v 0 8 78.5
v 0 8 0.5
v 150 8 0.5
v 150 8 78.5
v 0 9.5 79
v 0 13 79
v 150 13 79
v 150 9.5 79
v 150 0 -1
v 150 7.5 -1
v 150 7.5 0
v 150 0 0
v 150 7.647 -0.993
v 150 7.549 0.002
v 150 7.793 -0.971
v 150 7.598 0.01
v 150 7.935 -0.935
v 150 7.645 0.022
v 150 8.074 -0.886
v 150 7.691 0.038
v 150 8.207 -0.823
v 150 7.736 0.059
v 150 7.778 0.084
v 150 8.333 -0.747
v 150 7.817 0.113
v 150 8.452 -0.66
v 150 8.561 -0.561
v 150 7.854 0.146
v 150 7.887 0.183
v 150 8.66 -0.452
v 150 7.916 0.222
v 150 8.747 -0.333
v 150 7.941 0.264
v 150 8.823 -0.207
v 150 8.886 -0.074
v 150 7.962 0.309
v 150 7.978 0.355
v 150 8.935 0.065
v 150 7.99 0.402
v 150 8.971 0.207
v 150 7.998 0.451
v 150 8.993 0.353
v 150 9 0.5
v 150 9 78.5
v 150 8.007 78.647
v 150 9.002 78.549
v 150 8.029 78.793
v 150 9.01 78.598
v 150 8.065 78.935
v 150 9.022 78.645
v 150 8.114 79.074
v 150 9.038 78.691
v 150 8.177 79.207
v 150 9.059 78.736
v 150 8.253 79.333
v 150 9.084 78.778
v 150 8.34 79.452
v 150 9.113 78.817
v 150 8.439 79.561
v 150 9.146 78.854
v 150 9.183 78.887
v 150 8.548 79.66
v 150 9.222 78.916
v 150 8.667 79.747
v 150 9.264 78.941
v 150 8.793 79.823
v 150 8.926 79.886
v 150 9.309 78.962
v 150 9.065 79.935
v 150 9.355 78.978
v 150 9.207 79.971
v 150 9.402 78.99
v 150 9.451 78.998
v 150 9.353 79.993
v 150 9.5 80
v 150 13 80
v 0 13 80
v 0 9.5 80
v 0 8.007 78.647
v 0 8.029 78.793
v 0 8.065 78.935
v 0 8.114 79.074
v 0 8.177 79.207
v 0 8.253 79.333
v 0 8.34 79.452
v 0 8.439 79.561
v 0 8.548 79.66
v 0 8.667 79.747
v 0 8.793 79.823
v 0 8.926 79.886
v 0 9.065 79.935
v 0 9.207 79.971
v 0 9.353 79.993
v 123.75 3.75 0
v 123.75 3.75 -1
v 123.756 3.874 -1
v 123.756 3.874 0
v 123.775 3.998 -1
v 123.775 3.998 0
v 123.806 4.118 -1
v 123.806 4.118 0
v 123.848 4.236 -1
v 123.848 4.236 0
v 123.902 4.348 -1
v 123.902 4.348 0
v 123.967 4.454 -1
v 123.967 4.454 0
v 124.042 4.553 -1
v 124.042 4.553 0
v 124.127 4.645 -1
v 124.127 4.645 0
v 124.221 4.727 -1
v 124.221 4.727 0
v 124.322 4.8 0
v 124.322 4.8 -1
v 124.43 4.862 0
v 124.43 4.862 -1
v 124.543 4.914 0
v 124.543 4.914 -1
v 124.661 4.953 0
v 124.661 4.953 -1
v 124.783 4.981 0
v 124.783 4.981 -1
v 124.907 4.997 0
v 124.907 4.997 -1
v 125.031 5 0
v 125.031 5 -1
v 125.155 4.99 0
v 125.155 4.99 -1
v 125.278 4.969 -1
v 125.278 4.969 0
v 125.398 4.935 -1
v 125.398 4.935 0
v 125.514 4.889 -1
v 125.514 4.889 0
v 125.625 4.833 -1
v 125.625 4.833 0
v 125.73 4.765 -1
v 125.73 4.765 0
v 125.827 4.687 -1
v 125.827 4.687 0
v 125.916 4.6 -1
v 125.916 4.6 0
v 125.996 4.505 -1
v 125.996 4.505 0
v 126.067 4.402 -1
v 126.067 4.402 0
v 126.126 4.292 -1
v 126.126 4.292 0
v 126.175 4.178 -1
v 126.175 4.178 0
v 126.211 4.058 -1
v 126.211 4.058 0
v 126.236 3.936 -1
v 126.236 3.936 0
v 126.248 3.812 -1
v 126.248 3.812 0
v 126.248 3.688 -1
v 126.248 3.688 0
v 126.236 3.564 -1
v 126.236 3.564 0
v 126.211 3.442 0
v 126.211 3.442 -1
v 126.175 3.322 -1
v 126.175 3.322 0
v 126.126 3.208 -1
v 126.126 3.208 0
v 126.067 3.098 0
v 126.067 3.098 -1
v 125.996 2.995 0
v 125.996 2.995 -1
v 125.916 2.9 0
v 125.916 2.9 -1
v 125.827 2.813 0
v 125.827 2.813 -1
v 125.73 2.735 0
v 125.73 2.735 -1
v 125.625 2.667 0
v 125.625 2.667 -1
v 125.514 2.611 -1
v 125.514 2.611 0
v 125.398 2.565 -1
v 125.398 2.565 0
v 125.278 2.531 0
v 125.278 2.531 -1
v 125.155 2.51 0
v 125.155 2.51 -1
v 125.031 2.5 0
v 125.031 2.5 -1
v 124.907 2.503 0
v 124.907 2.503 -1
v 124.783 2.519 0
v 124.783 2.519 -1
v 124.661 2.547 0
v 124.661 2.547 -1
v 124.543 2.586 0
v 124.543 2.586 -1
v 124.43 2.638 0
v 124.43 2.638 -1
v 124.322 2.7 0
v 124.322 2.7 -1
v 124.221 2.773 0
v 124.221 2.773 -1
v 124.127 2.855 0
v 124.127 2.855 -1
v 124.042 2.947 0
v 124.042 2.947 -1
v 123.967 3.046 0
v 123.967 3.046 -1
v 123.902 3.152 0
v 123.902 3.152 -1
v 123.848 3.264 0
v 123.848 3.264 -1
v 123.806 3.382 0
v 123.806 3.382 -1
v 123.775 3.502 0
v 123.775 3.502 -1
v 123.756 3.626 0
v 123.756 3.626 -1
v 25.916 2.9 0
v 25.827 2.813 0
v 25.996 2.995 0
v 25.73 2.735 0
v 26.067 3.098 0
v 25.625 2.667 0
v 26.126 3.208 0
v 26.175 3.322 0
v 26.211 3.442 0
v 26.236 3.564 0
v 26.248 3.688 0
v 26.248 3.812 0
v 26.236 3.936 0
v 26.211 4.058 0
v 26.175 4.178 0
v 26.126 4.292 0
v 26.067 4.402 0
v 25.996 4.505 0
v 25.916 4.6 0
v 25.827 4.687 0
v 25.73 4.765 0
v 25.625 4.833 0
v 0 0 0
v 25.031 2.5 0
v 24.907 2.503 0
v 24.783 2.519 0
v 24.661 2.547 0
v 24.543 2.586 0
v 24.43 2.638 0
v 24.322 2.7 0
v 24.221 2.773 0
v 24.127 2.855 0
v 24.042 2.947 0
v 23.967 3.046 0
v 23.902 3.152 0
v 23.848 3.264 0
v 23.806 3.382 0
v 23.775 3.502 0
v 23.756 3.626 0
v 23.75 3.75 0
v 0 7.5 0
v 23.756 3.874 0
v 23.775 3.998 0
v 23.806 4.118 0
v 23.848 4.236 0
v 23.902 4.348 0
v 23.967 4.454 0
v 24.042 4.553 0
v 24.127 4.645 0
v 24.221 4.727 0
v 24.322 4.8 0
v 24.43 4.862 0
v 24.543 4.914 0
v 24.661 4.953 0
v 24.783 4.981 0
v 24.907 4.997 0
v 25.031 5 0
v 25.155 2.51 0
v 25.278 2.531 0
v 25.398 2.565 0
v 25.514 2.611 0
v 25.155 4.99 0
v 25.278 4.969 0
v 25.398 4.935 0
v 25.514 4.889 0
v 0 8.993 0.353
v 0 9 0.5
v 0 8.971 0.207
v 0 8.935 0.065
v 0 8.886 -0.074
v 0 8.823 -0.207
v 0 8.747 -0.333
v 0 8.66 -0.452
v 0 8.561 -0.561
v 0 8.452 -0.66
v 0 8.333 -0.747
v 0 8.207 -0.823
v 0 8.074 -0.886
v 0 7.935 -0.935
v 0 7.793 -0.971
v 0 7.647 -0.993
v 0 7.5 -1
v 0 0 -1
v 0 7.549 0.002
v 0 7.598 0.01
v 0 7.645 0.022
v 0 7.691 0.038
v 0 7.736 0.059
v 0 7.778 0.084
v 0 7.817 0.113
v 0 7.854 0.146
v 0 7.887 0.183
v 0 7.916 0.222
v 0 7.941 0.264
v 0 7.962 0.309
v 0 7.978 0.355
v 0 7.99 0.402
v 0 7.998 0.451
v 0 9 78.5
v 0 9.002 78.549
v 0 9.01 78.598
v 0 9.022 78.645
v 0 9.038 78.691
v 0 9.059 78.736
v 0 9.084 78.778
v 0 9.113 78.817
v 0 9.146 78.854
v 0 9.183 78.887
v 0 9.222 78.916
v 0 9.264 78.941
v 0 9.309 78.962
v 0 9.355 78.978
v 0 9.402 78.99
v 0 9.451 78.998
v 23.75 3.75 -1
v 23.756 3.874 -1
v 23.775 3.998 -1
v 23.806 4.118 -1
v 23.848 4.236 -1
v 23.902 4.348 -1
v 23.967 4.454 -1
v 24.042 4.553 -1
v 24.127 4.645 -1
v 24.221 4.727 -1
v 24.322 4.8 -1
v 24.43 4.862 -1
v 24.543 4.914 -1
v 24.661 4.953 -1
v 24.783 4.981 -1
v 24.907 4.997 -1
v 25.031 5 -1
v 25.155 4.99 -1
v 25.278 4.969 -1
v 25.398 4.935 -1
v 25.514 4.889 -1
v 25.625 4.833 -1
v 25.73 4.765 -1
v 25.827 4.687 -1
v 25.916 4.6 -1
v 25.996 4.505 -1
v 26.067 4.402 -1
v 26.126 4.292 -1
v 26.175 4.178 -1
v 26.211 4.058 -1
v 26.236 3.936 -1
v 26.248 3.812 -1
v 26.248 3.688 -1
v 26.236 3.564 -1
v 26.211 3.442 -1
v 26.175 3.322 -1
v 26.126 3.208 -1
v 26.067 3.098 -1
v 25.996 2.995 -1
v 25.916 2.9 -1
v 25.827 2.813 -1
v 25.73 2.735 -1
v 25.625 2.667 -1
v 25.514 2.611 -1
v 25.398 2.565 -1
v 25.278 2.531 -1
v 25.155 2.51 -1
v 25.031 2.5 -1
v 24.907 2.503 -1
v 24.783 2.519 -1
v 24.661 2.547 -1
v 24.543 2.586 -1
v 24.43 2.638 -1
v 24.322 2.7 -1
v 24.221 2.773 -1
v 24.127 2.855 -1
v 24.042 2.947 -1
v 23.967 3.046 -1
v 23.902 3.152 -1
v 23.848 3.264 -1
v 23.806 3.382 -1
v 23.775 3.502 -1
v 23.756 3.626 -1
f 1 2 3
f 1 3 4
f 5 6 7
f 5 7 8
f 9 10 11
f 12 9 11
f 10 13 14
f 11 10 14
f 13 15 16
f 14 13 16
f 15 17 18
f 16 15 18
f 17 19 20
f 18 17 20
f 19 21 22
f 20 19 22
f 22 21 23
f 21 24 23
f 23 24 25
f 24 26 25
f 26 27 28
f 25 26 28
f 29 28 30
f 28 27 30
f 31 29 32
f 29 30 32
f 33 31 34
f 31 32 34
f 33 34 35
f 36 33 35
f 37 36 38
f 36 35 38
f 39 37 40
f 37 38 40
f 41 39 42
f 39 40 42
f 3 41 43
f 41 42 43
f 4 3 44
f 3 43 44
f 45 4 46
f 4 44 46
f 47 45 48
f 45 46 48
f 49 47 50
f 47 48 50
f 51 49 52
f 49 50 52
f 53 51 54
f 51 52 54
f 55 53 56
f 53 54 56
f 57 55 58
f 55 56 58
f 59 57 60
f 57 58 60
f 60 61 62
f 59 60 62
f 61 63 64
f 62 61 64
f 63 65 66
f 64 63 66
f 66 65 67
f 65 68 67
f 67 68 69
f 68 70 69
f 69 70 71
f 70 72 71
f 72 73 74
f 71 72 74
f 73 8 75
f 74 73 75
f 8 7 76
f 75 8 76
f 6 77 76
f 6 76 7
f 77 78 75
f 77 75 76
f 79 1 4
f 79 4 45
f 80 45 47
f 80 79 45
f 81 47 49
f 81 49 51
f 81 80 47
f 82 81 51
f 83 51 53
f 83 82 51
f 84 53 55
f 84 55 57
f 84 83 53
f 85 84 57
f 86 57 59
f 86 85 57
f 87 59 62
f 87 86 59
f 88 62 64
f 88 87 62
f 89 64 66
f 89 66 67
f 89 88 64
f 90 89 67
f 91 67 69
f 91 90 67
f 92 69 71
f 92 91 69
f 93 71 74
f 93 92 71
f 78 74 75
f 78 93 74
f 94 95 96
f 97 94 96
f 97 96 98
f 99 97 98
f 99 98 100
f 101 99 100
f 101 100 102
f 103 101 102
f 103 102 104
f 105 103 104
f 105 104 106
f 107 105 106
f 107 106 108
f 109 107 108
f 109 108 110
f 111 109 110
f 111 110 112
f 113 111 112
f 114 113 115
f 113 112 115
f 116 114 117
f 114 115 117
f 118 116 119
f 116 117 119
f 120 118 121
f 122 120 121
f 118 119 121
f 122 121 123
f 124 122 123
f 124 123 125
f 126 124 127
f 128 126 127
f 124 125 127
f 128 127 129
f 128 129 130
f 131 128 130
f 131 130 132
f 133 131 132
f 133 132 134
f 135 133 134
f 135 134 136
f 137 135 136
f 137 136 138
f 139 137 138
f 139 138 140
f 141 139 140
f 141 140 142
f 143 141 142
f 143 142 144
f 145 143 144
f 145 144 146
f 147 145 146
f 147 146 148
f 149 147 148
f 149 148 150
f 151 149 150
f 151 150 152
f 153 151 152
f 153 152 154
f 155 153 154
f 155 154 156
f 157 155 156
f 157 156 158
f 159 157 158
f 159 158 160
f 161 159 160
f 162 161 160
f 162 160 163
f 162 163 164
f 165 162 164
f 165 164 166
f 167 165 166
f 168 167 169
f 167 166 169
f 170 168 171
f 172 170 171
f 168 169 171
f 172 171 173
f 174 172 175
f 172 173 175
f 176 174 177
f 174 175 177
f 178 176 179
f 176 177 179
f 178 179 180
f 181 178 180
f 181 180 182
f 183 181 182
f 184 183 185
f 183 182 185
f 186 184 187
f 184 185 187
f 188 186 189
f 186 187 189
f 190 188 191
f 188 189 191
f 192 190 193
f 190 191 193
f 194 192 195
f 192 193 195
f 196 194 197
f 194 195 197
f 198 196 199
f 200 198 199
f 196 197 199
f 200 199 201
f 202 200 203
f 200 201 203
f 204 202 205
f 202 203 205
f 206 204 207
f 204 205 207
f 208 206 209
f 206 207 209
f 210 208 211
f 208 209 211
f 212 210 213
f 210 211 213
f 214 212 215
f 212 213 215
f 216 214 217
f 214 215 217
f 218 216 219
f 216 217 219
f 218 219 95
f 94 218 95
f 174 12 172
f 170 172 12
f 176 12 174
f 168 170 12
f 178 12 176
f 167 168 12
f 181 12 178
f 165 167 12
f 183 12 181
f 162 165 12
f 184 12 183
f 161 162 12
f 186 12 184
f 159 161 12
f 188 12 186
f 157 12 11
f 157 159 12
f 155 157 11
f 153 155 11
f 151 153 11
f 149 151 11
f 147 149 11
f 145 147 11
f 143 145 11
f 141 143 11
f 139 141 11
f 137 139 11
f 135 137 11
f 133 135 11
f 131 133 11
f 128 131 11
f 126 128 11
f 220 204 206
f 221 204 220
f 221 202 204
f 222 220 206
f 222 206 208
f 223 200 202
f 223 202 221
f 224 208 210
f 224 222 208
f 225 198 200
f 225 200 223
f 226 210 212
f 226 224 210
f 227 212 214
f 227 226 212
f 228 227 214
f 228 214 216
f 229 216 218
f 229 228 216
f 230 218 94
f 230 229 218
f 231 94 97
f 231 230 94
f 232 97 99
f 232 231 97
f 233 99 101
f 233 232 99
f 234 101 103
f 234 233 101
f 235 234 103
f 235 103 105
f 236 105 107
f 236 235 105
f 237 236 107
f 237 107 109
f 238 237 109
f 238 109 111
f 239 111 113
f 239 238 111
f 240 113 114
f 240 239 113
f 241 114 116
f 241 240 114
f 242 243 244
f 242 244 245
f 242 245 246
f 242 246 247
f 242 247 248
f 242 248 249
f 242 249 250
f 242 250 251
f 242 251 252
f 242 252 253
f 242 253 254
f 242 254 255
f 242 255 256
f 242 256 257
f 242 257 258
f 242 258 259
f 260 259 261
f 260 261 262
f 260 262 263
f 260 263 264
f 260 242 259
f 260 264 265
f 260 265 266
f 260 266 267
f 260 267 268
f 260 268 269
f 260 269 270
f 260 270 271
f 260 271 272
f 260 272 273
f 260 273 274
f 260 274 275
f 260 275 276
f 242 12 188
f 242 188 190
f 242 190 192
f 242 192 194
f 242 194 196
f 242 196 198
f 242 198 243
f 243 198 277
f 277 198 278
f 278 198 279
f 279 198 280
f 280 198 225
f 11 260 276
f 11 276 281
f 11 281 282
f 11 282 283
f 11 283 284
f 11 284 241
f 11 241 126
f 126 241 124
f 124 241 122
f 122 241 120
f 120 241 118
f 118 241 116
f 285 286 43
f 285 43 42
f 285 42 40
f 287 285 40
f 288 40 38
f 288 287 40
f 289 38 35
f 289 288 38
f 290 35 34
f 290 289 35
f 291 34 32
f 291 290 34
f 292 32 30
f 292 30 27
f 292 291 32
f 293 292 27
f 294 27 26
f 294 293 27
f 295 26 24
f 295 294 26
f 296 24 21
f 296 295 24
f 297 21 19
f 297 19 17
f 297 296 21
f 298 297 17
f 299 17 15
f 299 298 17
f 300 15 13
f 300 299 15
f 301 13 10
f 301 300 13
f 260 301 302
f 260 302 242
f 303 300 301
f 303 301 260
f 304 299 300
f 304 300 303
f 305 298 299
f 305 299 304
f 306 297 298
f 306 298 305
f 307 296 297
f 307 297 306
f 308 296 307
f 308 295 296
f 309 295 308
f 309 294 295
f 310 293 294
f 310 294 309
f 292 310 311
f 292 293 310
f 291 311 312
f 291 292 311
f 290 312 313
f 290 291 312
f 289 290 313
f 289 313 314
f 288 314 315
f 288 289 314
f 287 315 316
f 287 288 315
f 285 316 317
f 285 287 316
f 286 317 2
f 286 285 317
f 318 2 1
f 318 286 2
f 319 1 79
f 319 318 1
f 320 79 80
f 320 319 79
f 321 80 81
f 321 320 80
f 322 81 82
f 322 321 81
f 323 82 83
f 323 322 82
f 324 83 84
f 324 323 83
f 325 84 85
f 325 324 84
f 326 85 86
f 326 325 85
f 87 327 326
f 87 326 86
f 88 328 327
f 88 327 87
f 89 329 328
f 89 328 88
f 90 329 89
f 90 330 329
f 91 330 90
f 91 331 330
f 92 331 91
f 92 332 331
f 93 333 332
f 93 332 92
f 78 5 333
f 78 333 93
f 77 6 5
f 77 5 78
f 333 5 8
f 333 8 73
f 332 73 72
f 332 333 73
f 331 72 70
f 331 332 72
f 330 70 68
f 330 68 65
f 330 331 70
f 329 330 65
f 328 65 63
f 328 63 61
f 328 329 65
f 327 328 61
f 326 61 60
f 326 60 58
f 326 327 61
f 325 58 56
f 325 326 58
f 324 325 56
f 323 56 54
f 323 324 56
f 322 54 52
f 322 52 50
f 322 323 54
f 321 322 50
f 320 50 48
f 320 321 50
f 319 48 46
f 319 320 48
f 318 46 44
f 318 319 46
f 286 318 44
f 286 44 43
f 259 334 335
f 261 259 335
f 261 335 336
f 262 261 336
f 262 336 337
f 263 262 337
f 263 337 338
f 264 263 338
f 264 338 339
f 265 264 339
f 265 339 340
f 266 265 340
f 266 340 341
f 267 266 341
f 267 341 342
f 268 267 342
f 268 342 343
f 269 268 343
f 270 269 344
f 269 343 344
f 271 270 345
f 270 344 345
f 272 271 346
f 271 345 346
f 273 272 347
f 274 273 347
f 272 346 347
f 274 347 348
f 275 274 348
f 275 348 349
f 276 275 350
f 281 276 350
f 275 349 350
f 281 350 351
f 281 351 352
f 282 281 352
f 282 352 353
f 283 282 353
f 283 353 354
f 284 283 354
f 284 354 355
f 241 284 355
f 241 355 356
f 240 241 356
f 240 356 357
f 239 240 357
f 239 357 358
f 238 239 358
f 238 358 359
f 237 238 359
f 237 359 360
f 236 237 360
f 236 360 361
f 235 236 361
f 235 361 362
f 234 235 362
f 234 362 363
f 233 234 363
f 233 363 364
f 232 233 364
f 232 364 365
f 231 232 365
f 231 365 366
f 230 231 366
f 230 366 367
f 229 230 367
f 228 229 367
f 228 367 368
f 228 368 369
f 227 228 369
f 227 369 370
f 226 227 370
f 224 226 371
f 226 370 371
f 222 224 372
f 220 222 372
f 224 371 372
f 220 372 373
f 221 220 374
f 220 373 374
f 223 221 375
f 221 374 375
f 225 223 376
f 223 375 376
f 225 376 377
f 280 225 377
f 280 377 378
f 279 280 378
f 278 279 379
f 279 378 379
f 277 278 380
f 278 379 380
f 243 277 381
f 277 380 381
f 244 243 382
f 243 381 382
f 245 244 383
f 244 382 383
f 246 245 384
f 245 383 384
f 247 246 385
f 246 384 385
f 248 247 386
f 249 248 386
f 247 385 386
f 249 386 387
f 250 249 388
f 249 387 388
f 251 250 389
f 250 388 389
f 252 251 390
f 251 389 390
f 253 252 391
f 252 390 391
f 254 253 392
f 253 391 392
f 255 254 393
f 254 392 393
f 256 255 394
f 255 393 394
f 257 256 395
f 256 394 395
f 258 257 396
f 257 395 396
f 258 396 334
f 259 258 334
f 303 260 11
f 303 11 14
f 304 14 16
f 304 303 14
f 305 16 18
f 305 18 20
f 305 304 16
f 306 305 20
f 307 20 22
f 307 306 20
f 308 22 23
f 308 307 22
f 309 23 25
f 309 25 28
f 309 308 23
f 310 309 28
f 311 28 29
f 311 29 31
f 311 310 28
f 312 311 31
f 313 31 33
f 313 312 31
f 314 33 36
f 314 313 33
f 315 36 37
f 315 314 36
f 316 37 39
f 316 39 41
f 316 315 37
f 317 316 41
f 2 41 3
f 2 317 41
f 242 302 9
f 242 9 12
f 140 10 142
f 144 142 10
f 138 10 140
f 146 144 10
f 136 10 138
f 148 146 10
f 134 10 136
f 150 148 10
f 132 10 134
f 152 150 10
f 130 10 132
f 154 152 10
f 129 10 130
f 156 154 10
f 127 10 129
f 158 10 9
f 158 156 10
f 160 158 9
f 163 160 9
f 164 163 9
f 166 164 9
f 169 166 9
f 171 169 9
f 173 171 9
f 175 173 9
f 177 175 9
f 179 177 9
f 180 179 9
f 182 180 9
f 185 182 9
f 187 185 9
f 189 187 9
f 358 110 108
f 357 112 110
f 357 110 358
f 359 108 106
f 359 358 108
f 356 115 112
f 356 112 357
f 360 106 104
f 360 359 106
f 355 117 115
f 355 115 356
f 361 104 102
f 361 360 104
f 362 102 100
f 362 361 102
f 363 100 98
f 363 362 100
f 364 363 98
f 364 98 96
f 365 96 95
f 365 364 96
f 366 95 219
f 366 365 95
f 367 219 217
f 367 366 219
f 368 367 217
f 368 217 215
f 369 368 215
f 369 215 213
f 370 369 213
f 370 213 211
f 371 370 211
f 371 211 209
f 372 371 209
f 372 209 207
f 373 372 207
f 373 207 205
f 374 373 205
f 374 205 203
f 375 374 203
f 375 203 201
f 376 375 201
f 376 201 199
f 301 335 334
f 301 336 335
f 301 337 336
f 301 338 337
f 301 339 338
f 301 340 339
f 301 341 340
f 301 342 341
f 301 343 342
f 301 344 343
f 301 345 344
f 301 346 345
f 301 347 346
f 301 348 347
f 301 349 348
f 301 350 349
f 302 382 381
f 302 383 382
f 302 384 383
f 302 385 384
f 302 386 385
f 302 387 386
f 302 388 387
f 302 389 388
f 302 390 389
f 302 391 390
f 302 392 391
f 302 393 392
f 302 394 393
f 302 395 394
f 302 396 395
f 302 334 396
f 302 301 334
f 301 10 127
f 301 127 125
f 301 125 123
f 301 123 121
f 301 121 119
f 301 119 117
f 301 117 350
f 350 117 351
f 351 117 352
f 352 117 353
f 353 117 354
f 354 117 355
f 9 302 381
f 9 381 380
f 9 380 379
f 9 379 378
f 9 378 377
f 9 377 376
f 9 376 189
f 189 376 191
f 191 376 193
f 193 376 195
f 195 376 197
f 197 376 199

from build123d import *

# Parameters (mm, degrees)
BASE_FLANGE1_DEPTH = 150
SKETCH2_R          = 1.25
CUT_EXTRUDE1_DEPTH = 10


# Sheet-metal steps are written as plain solids
with BuildPart() as part:
    # Sketch1 → Base-Flange1 (new body)
    with BuildSketch(Plane(origin=(0, 0, 0), x_dir=(0, 0, -1), z_dir=(1, 0, 0))):
        with BuildLine():
            Line((0, 0), (0, 7.5))
            ThreePointArc((0, 7.5), (-0.146446609, 7.853553391), (-0.5, 8))
            Line((-0.5, 8), (-78.5, 8))
            ThreePointArc((-78.5, 8), (-79.560660172, 8.439339828), (-80, 9.5))
            Line((-80, 9.5), (-80, 13))
            Line((-80, 13), (-79, 13))
            Line((-79, 13), (-79, 9.5))
            ThreePointArc((-79, 9.5), (-78.853553391, 9.146446609), (-78.5, 9))
            Line((-78.5, 9), (-0.5, 9))
            ThreePointArc((-0.5, 9), (0.560660172, 8.560660172), (1, 7.5))
            Line((1, 7.5), (1, 0))
            Line((1, 0), (0, 0))
        make_face()
    extrude(amount=BASE_FLANGE1_DEPTH)

    # Sketch2 → Cut-Extrude1 (cut)
    with BuildSketch(Plane(origin=(0, 0, -1), x_dir=(-1, 0, 0), z_dir=(0, 0, -1))):
        with Locations((-25, 3.75)):
            Circle(SKETCH2_R)
        with Locations((-125, 3.75)):
            Circle(SKETCH2_R)
    extrude(amount=-CUT_EXTRUDE1_DEPTH, mode=Mode.SUBTRACT)


solid = part.part
